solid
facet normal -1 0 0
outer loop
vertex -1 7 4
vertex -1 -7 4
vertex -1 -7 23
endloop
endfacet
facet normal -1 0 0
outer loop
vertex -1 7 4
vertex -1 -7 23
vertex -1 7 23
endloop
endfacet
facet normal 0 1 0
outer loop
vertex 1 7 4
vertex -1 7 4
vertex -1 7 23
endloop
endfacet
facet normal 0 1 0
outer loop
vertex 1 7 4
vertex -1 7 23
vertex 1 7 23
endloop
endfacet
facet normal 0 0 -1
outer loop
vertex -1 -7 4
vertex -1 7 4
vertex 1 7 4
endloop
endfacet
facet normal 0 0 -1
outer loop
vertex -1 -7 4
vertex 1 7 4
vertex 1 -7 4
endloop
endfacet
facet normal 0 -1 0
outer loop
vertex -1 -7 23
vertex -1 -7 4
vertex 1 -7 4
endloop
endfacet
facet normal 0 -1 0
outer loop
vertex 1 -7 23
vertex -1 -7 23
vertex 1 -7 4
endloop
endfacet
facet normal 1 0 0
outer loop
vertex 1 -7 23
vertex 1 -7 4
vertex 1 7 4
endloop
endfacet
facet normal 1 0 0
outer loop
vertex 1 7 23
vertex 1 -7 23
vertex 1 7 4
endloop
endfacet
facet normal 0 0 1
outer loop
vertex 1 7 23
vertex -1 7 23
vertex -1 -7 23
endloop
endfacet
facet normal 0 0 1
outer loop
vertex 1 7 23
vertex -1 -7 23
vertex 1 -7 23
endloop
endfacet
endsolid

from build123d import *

# Parameters (mm, degrees)
SKETCH1_W           = 2
SKETCH1_H           = 14
BOSS_EXTRUDE1_DEPTH = 23
SKETCH2_W           = 2
SKETCH2_H           = 14
CUT_EXTRUDE1_DEPTH  = 10
CUT_EXTRUDE2_DEPTH  = 10


with BuildPart() as part:
    # Sketch1 → Boss-Extrude1 (new body)
    with BuildSketch(Plane.XY):
        Rectangle(SKETCH1_W, SKETCH1_H)
    extrude(amount=BOSS_EXTRUDE1_DEPTH)

    # Sketch2 → Cut-Extrude1 (cut)
    with BuildSketch(Plane.ZY.offset(1)):
        with Locations((1, 0)):
            Rectangle(SKETCH2_W, SKETCH2_H)
    extrude(amount=-CUT_EXTRUDE1_DEPTH, mode=Mode.SUBTRACT)

    # Sketch3 → Cut-Extrude2 (cut)
    with BuildSketch(Plane.ZY.offset(1)):
        Polygon((4, 7), (4, -7), (2, -7), (2, 7), (3.440196678, 7), align=None)
    extrude(amount=-CUT_EXTRUDE2_DEPTH, mode=Mode.SUBTRACT)


solid = part.part
